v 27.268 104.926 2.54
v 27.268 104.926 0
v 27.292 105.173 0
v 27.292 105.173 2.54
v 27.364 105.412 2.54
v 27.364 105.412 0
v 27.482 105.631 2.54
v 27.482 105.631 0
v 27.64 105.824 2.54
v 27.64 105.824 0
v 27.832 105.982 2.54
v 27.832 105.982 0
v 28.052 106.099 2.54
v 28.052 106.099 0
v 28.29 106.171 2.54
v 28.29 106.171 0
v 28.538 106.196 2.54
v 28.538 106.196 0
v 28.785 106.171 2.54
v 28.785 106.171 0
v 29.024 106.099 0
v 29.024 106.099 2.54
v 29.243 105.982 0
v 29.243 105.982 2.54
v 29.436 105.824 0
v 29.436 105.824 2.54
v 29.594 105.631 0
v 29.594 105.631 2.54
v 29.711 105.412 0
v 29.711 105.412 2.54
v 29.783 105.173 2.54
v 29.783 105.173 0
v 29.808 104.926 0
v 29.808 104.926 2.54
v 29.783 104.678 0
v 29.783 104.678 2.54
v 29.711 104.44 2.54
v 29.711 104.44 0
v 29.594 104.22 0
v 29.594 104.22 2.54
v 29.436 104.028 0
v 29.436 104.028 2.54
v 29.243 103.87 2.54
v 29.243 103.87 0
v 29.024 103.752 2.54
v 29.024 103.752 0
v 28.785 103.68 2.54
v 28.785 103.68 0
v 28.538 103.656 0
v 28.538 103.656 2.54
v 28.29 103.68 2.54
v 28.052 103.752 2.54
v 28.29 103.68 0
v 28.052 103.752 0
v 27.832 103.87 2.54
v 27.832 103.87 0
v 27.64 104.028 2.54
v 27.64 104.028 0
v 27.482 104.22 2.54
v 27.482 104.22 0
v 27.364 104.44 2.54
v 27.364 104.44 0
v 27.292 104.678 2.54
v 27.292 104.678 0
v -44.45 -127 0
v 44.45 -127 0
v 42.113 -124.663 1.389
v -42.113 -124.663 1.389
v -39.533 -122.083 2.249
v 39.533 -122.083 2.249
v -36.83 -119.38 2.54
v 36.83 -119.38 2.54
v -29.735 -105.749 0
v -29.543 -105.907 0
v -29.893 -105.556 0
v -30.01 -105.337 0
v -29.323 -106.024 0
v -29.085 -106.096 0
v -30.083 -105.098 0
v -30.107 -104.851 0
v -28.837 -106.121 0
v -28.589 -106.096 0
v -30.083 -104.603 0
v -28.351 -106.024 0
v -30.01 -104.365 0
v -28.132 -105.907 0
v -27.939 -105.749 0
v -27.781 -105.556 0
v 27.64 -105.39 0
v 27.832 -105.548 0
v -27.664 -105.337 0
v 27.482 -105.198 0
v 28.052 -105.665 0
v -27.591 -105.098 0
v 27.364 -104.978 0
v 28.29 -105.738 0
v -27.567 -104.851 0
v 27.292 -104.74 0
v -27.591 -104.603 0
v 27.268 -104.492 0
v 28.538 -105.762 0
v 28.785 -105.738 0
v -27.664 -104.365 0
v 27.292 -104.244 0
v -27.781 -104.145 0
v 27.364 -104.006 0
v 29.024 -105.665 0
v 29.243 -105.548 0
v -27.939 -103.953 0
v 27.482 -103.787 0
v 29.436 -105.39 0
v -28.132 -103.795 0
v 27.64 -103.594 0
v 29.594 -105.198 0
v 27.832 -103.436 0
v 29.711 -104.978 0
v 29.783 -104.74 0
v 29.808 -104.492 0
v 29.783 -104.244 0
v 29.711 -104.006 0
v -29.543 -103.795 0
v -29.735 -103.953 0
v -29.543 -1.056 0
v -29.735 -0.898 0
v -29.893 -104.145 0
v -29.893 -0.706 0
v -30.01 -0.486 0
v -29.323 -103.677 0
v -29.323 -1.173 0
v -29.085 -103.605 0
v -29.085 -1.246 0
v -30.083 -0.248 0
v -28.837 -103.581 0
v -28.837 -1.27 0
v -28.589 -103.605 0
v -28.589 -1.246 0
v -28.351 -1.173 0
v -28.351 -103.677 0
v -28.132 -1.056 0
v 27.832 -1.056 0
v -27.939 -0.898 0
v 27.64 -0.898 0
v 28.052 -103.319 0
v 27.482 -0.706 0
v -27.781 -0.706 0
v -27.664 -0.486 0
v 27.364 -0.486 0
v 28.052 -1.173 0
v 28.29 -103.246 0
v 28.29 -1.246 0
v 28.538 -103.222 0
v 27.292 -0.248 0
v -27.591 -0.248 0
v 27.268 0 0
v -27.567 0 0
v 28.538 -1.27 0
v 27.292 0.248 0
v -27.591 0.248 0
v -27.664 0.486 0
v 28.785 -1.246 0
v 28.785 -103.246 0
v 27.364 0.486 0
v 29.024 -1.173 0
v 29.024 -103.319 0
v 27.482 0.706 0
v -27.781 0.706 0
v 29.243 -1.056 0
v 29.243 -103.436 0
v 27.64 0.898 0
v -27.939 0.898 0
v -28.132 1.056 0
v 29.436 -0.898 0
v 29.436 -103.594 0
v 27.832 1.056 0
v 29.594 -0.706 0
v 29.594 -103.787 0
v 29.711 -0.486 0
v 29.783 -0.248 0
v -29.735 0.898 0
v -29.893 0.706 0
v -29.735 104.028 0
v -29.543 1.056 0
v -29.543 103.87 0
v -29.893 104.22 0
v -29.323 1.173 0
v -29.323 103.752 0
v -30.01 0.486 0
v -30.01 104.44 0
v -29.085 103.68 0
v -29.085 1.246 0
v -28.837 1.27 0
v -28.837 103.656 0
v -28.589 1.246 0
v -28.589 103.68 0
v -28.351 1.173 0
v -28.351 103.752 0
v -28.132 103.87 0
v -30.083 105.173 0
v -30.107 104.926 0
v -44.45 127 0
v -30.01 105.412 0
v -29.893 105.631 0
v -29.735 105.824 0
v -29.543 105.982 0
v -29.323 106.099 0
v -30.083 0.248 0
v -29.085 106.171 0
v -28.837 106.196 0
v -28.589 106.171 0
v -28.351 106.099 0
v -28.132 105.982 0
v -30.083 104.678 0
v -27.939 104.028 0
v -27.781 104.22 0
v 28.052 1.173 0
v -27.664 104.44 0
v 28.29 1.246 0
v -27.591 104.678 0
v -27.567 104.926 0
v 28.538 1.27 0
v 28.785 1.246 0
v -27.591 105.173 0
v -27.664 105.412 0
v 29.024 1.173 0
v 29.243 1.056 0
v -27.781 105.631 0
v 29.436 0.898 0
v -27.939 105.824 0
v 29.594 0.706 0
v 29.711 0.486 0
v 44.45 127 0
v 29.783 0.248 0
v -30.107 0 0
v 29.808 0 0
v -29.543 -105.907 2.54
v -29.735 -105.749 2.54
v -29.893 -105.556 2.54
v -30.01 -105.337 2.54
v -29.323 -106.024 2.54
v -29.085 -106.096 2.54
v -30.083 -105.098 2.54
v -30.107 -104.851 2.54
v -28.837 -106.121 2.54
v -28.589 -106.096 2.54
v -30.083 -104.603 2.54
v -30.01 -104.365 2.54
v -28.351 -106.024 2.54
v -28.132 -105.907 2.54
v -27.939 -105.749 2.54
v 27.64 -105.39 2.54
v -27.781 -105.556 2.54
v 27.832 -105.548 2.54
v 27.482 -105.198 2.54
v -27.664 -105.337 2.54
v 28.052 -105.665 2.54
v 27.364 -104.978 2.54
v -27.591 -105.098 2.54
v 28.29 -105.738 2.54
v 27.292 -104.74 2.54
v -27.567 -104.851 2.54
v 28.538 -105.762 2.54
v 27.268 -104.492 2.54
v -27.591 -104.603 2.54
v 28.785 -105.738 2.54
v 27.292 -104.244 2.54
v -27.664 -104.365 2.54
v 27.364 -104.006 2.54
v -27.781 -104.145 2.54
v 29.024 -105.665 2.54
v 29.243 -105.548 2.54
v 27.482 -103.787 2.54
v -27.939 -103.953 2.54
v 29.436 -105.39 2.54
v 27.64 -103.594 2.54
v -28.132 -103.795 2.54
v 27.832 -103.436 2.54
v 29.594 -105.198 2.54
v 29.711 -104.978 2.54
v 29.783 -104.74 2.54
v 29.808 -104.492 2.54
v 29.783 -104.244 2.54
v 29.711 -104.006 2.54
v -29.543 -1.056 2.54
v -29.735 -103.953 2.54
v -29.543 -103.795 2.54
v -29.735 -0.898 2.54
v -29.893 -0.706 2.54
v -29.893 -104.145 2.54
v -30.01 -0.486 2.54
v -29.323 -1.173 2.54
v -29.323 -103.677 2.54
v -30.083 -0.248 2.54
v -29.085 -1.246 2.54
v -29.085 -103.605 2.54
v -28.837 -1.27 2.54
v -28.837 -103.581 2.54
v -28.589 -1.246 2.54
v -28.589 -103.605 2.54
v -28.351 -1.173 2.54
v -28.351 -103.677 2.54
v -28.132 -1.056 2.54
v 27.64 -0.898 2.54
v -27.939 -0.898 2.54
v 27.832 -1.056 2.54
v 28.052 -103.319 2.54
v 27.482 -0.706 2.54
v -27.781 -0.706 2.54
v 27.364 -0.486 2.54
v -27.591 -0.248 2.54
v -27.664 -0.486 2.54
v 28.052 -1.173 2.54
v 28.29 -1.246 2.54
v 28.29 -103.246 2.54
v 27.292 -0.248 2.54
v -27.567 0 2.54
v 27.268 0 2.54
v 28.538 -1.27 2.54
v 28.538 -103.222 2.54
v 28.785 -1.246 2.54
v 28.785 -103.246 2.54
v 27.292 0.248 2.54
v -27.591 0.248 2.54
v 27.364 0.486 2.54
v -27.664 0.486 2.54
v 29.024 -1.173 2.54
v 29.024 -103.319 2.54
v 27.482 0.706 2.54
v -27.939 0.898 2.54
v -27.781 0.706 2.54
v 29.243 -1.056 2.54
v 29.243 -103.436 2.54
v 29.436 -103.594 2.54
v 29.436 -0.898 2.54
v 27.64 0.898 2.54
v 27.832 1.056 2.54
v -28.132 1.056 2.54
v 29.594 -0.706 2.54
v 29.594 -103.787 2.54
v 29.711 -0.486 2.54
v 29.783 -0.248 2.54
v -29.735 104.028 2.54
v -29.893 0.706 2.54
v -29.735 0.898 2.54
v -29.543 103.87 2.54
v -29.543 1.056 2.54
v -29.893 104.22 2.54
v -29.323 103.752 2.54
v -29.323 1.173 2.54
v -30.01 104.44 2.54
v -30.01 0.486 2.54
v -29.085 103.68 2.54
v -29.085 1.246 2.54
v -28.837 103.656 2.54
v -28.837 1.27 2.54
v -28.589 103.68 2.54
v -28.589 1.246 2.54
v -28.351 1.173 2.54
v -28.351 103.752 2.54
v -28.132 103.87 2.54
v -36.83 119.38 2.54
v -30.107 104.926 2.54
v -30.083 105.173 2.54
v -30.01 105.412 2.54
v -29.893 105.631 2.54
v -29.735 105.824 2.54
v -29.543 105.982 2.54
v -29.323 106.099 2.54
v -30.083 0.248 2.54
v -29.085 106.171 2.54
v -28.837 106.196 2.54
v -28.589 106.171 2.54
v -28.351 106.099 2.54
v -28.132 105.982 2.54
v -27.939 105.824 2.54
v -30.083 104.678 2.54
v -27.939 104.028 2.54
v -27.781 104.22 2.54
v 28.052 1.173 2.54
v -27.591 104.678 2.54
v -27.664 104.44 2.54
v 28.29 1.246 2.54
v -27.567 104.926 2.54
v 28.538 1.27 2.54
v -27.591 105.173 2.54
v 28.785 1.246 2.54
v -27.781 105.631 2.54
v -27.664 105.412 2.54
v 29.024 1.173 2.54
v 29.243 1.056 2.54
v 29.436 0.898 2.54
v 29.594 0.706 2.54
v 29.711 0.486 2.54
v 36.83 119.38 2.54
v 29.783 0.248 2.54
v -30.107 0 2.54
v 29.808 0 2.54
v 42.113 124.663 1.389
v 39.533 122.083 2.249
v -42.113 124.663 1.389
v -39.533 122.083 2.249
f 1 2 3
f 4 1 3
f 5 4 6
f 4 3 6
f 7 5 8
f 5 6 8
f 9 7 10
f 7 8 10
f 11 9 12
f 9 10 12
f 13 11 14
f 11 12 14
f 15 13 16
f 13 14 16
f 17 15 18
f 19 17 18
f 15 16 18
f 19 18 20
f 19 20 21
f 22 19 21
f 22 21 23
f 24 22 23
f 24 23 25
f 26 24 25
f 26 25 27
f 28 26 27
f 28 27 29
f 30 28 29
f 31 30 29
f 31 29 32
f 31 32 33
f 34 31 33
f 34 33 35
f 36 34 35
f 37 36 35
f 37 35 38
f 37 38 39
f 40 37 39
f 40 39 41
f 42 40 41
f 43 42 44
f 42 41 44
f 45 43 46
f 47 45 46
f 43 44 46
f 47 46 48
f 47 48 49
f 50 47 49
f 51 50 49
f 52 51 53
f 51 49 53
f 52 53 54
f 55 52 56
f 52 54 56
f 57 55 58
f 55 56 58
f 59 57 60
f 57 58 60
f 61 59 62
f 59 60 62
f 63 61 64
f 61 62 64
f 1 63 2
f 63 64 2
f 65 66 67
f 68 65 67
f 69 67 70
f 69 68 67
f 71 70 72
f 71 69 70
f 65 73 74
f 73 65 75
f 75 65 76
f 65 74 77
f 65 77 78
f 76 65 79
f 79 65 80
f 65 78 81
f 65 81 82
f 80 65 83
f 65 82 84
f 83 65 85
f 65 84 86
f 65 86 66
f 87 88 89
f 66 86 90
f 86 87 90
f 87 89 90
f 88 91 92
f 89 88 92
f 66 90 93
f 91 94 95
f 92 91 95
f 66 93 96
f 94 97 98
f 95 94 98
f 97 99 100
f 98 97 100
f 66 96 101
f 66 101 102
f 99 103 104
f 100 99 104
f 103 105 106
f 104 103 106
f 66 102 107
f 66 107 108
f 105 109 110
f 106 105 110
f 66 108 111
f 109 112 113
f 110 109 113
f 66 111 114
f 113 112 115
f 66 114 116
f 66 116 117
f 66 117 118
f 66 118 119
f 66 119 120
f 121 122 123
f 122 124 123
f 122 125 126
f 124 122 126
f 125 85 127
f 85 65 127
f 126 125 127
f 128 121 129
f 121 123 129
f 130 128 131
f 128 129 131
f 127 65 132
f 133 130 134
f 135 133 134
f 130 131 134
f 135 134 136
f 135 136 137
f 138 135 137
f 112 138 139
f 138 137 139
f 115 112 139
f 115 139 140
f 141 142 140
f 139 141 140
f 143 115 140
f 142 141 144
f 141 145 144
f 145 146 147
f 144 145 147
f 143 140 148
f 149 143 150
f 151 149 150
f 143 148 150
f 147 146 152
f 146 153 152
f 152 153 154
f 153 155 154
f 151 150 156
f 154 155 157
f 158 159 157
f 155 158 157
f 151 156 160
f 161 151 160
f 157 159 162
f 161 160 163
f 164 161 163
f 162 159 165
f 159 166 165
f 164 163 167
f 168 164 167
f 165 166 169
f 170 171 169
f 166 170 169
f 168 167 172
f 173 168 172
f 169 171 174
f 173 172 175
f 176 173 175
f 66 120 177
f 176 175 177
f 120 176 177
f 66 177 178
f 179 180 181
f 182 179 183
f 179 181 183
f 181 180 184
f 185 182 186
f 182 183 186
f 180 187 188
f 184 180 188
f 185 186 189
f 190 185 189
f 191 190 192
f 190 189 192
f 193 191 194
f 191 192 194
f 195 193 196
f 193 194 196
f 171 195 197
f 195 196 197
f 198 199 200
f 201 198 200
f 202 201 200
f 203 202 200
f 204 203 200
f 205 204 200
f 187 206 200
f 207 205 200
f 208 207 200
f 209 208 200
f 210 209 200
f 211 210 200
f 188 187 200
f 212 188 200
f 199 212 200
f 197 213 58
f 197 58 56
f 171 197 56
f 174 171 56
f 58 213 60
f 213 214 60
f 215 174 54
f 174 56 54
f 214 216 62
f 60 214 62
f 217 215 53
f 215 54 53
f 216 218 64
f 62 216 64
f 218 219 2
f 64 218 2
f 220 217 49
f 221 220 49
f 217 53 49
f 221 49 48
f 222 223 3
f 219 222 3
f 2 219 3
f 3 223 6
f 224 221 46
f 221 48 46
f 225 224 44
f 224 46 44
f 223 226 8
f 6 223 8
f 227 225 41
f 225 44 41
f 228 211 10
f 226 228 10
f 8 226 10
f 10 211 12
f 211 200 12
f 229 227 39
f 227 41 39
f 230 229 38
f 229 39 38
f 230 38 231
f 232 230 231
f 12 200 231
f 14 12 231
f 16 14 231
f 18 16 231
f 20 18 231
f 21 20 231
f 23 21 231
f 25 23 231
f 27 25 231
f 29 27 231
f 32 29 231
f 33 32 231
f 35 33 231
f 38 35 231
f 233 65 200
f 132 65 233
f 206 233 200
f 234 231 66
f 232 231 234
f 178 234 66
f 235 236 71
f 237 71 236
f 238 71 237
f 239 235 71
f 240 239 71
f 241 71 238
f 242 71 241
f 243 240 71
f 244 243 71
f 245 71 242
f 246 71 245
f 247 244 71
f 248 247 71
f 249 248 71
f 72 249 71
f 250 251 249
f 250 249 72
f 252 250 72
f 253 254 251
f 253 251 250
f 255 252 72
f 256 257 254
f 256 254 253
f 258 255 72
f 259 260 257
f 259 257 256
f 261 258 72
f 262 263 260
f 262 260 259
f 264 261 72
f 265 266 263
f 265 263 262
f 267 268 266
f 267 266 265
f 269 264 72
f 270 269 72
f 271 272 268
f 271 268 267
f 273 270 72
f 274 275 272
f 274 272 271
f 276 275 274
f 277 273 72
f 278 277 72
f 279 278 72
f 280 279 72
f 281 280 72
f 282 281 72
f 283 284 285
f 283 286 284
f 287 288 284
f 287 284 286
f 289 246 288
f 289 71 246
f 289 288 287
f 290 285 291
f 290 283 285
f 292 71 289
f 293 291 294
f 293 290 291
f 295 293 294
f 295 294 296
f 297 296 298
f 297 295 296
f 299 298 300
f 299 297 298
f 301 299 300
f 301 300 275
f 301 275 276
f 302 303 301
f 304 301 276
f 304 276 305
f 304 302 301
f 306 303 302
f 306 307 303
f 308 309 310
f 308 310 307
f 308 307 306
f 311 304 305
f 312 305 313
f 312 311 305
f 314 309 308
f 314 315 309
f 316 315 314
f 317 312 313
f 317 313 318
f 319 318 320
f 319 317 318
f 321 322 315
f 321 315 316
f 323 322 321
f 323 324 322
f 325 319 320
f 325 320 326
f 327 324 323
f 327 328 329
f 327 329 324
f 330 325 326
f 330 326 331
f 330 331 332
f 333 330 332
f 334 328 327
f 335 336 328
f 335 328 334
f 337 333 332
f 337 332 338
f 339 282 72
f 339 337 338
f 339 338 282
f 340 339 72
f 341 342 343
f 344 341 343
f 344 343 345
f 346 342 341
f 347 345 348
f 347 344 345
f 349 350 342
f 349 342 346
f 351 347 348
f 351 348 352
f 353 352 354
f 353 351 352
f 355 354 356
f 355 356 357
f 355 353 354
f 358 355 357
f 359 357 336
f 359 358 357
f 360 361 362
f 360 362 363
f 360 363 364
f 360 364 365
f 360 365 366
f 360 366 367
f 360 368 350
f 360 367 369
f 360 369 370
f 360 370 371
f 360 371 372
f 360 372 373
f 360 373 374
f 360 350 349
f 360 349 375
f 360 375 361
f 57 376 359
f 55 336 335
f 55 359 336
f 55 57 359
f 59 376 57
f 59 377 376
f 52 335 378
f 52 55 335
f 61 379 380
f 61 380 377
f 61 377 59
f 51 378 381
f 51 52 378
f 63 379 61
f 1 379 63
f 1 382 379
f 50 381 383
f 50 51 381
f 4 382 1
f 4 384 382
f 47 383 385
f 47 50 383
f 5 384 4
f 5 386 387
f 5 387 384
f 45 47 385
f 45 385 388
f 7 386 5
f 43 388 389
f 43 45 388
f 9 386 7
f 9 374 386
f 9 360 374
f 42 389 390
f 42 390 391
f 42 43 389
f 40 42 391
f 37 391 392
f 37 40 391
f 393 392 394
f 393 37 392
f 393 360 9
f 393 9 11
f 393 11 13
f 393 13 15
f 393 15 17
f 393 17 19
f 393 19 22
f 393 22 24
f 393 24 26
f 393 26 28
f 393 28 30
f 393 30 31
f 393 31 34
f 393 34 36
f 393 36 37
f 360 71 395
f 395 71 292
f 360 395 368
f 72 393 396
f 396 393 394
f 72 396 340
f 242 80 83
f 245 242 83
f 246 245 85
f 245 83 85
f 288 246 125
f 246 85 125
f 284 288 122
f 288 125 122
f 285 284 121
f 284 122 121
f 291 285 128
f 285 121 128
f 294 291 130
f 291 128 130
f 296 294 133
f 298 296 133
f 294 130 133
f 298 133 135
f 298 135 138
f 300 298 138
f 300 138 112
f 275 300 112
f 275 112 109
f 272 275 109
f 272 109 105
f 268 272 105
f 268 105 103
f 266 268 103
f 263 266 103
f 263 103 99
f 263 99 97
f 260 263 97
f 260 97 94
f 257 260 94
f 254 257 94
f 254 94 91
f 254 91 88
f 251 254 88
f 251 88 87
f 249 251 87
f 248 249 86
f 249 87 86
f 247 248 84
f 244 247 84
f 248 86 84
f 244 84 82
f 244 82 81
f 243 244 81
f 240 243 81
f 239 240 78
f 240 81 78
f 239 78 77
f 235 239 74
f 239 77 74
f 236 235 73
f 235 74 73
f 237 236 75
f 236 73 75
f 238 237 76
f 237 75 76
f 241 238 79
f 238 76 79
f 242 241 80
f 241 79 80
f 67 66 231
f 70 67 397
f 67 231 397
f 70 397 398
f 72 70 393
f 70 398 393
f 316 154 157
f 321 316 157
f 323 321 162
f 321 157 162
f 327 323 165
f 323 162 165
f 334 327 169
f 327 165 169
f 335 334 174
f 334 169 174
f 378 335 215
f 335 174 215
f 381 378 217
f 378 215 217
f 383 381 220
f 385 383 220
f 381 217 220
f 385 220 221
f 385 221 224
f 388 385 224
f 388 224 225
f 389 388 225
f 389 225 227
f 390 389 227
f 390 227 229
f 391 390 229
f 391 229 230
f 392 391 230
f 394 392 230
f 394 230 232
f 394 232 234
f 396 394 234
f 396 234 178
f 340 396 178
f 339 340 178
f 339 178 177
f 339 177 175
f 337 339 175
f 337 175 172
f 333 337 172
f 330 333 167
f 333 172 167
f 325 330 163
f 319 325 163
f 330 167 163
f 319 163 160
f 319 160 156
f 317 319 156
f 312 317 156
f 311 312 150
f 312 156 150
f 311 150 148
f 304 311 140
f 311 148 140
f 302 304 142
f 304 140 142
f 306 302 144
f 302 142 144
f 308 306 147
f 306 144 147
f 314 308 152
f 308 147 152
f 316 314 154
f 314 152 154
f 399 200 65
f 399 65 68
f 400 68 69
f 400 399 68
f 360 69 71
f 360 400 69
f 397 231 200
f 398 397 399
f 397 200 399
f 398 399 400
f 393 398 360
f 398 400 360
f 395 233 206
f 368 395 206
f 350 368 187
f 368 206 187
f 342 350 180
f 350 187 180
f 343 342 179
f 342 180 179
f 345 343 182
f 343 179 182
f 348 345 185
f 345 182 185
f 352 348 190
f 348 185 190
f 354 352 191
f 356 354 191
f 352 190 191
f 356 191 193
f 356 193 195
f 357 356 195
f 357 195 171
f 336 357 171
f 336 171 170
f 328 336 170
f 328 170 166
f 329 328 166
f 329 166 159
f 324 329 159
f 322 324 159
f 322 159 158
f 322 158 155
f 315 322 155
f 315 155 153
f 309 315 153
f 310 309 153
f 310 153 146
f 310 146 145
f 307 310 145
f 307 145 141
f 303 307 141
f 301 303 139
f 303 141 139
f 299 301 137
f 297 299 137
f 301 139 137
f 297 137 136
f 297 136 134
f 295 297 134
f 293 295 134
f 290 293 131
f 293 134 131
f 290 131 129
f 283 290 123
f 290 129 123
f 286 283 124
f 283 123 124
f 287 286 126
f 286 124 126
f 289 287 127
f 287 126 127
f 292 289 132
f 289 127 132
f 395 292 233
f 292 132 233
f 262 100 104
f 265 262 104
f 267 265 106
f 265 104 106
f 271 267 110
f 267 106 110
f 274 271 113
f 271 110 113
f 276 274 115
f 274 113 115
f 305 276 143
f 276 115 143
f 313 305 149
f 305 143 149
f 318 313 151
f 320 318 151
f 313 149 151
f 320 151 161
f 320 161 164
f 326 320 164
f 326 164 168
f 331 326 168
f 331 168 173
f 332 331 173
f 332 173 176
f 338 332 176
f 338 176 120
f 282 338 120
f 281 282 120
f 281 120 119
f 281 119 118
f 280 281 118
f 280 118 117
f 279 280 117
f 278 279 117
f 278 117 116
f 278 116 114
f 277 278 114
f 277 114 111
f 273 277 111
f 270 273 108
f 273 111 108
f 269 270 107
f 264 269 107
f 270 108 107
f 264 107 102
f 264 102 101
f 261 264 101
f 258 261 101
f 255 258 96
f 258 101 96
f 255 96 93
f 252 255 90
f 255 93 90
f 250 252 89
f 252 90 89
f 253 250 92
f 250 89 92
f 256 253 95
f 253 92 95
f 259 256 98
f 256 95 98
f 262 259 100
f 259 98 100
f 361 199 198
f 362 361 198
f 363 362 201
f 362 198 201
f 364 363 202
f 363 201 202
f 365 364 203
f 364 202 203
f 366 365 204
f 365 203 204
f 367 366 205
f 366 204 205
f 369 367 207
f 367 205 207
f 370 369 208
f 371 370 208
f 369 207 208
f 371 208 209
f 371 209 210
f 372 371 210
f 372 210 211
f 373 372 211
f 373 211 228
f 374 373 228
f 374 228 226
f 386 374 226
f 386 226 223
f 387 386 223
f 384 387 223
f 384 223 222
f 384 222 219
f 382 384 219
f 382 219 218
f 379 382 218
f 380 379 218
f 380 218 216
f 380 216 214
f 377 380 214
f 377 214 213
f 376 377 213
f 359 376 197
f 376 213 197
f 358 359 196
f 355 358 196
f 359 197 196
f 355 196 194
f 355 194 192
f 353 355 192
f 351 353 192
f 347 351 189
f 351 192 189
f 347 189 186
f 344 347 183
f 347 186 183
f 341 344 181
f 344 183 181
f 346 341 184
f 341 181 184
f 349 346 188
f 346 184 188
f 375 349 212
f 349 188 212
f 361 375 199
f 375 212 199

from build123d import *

# Parameters (mm, degrees)
F0_W        = 88.9
F0_H        = 254
F1_DEPTH    = 2.54
F2_T1_DEPTH = 127
F2_T3_DEPTH = 292.1
F5_D        = 2.54
F5_DEPTH    = 5.08
F5_TIP      = 0.7630929862


# Not quite as in the source:
# - a fillet or chamfer that OpenCascade refuses, or shapes differently, is made with other operations: its cross-section is extruded or revolved along the edge and cut away or added


with BuildPart() as f1:
    # F0 (on Top) → F1 (new body)
    with BuildSketch(Plane.XY):
        Rectangle(F0_W, F0_H)
    extrude(amount=F1_DEPTH)

    # F2: fillet of radius 12.7 on 4 edges, made by hand

    # F2_s2 → F2_t1 (cut)
    with BuildSketch(Plane.YZ.offset(-63.5)):
        with BuildLine():
            ThreePointArc((127, 0), (123.3960926284, 1.8882778852), (119.38, 2.54))
            Line((119.38, 2.54), (127, 2.54))
            Line((127, 2.54), (127, 0))
        make_face()
        with BuildLine():
            ThreePointArc((-127, 0), (-123.3960926284, 1.8882778852), (-119.38, 2.54))
            Line((-119.38, 2.54), (-127, 2.54))
            Line((-127, 2.54), (-127, 0))
        make_face()
    extrude(amount=F2_T1_DEPTH, mode=Mode.SUBTRACT)

    # F2_s4 → F2_t3 (cut)
    with BuildSketch(Plane.XZ.offset(-146.05)):
        with BuildLine():
            ThreePointArc((-44.45, 0), (-40.8460926284, 1.8882778852), (-36.83, 2.54))
            Line((-36.83, 2.54), (-44.45, 2.54))
            Line((-44.45, 2.54), (-44.45, 0))
        make_face()
        with BuildLine():
            ThreePointArc((44.45, 0), (40.8460926284, 1.8882778852), (36.83, 2.54))
            Line((36.83, 2.54), (44.45, 2.54))
            Line((44.45, 2.54), (44.45, 0))
        make_face()
    extrude(amount=F2_T3_DEPTH, mode=Mode.SUBTRACT)

    # F5
    with Locations(Plane.XY.offset(2.54)):
        with Locations((-28.8370940834, 104.9257144332), (28.5376422107, 104.9257144332), (28.5376422107, 0), (-28.8370940834, 0), (-28.8370940834, -104.8506721854), (28.5376422107, -104.4920757413)):
            Hole(F5_D / 2, depth=F5_DEPTH)
            with Locations((0, 0, -(F5_DEPTH + F5_TIP / 2))):  # 118° drill point
                Cone(0, F5_D / 2, F5_TIP, mode=Mode.SUBTRACT)


solid = f1.part
